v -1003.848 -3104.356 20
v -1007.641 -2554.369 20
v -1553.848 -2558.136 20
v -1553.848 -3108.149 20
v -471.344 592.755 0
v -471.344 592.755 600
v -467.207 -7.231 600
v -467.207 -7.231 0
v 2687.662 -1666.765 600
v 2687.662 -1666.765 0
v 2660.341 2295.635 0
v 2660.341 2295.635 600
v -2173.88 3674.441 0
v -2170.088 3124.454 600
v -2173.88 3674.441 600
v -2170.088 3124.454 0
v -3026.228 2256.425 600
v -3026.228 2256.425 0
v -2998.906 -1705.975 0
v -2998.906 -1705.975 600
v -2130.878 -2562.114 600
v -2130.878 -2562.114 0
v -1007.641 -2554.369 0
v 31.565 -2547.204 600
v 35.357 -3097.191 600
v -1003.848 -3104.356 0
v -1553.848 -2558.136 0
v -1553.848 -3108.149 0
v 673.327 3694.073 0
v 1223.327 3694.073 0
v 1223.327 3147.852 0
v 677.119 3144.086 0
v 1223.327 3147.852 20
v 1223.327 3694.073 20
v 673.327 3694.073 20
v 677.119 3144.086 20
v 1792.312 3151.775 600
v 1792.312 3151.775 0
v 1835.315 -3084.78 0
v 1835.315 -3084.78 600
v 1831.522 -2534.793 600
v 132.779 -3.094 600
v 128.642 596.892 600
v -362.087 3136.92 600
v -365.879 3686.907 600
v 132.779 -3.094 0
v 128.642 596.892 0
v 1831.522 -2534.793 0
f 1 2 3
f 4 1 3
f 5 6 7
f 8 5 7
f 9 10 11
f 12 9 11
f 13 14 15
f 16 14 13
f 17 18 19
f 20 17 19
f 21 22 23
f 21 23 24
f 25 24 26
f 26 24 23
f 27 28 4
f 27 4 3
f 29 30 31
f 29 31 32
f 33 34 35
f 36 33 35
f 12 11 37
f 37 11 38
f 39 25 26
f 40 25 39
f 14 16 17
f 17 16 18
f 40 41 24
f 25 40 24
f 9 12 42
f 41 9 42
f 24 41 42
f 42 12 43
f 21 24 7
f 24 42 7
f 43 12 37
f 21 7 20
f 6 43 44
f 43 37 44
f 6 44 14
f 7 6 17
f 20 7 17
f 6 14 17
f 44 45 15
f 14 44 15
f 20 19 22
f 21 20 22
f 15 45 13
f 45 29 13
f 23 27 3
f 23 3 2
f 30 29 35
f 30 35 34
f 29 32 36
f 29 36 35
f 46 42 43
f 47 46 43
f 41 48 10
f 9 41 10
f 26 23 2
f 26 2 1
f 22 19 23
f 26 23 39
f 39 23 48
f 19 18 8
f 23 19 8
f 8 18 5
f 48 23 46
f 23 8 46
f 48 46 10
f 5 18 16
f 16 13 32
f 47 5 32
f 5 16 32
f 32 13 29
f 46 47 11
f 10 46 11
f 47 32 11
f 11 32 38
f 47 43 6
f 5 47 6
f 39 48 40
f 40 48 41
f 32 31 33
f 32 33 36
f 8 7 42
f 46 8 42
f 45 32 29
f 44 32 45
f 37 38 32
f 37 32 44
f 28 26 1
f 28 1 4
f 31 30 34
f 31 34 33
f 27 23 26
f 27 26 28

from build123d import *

# Parameters (mm, degrees)
BOSS_EXTRUDE1_DEPTH    = 600
BOSS_EXTRUDE2_DEPTH    = 550
BOSS_EXTRUDE4_DEPTH    = 550
BOSS_EXTRUDE15_DEPTH   = 20
BOSS_EXTRUDE15_2_DEPTH = 20
CUT_EXTRUDE1_DEPTH     = 1000


with BuildPart() as part:
    # Sketch6 → Boss-Extrude1 (new body)
    with BuildSketch(Plane.XY):
        Polygon((2687.662150109, -1666.76457761), (2660.34067182, 2295.63542239), (1792.312348512, 3151.775288262), (-2170.087651488, 3124.453809972), (-3026.22751736, 2256.425486664), (-2998.906039071, -1705.974513336), (-2130.877715762, -2562.114379207), (1831.522284238, -2534.792900918), align=None)
    extrude(amount=BOSS_EXTRUDE1_DEPTH)

    # Sketch7 → Boss-Extrude2 (add)
    with BuildSketch(Plane(origin=(-21.645829458, 3139.267712303, 0), x_dir=(0.9999762290643144, 0.0068950203998148505, 0), z_dir=(-0.0068950203998148505, 0.9999762290643144, 0))):
        Polygon((698.781298478, 0), (-340.449186063, -600), (-2148.492893716, -600), (-2148.492893716, 0), align=None)
    extrude(amount=BOSS_EXTRUDE2_DEPTH)

    # Sketch10 → Boss-Extrude4 (add)
    with BuildSketch(Plane(origin=(17.564106268, -2547.300476876, 0), x_dir=(0.9999762290643144, 0.006895020399814854, 0), z_dir=(0.006895020399814854, -0.9999762290643144, 0))):
        Polygon((1814.001298478, 600), (14.001298478, 600), (-1025.229186063, 0), (1814.001298478, 0), align=None)
    extrude(amount=BOSS_EXTRUDE4_DEPTH)

    # Sketch22 → Cut-Extrude1 (cut)
    with BuildSketch(Plane.XY.offset(600)):
        Polygon((128.641678954, 596.891829386), (-471.344058485, 592.754817146), (-467.207046245, -7.230920292), (132.778691194, -3.093908052), align=None)
    extrude(amount=-CUT_EXTRUDE1_DEPTH, mode=Mode.SUBTRACT)


with BuildPart() as body_2:
    # Sketch18 → Boss-Extrude15 (new body)
    with BuildSketch(Plane(origin=(0, 0, 0), x_dir=(-1, 0, 0), z_dir=(0, 0, -1))):
        Polygon((-677.118858334, 3144.085823612), (-673.326597115, 3694.072749597), (-1223.326597115, 3694.072749597), (-1223.326597115, 3147.852026639), align=None)
    extrude(amount=-BOSS_EXTRUDE15_DEPTH)


with BuildPart() as body_3:
    # Sketch18 → Boss-Extrude15 2 (new body)
    with BuildSketch(Plane(origin=(0, 0, 0), x_dir=(-1, 0, 0), z_dir=(0, 0, -1))):
        Polygon((1007.640709138, -2554.369453029), (1003.848447918, -3104.356379014), (1553.848447918, -3108.148730382), (1553.848447918, -2558.135656056), align=None)
    extrude(amount=-BOSS_EXTRUDE15_2_DEPTH)


solid = Compound([part.part, body_2.part, body_3.part])
